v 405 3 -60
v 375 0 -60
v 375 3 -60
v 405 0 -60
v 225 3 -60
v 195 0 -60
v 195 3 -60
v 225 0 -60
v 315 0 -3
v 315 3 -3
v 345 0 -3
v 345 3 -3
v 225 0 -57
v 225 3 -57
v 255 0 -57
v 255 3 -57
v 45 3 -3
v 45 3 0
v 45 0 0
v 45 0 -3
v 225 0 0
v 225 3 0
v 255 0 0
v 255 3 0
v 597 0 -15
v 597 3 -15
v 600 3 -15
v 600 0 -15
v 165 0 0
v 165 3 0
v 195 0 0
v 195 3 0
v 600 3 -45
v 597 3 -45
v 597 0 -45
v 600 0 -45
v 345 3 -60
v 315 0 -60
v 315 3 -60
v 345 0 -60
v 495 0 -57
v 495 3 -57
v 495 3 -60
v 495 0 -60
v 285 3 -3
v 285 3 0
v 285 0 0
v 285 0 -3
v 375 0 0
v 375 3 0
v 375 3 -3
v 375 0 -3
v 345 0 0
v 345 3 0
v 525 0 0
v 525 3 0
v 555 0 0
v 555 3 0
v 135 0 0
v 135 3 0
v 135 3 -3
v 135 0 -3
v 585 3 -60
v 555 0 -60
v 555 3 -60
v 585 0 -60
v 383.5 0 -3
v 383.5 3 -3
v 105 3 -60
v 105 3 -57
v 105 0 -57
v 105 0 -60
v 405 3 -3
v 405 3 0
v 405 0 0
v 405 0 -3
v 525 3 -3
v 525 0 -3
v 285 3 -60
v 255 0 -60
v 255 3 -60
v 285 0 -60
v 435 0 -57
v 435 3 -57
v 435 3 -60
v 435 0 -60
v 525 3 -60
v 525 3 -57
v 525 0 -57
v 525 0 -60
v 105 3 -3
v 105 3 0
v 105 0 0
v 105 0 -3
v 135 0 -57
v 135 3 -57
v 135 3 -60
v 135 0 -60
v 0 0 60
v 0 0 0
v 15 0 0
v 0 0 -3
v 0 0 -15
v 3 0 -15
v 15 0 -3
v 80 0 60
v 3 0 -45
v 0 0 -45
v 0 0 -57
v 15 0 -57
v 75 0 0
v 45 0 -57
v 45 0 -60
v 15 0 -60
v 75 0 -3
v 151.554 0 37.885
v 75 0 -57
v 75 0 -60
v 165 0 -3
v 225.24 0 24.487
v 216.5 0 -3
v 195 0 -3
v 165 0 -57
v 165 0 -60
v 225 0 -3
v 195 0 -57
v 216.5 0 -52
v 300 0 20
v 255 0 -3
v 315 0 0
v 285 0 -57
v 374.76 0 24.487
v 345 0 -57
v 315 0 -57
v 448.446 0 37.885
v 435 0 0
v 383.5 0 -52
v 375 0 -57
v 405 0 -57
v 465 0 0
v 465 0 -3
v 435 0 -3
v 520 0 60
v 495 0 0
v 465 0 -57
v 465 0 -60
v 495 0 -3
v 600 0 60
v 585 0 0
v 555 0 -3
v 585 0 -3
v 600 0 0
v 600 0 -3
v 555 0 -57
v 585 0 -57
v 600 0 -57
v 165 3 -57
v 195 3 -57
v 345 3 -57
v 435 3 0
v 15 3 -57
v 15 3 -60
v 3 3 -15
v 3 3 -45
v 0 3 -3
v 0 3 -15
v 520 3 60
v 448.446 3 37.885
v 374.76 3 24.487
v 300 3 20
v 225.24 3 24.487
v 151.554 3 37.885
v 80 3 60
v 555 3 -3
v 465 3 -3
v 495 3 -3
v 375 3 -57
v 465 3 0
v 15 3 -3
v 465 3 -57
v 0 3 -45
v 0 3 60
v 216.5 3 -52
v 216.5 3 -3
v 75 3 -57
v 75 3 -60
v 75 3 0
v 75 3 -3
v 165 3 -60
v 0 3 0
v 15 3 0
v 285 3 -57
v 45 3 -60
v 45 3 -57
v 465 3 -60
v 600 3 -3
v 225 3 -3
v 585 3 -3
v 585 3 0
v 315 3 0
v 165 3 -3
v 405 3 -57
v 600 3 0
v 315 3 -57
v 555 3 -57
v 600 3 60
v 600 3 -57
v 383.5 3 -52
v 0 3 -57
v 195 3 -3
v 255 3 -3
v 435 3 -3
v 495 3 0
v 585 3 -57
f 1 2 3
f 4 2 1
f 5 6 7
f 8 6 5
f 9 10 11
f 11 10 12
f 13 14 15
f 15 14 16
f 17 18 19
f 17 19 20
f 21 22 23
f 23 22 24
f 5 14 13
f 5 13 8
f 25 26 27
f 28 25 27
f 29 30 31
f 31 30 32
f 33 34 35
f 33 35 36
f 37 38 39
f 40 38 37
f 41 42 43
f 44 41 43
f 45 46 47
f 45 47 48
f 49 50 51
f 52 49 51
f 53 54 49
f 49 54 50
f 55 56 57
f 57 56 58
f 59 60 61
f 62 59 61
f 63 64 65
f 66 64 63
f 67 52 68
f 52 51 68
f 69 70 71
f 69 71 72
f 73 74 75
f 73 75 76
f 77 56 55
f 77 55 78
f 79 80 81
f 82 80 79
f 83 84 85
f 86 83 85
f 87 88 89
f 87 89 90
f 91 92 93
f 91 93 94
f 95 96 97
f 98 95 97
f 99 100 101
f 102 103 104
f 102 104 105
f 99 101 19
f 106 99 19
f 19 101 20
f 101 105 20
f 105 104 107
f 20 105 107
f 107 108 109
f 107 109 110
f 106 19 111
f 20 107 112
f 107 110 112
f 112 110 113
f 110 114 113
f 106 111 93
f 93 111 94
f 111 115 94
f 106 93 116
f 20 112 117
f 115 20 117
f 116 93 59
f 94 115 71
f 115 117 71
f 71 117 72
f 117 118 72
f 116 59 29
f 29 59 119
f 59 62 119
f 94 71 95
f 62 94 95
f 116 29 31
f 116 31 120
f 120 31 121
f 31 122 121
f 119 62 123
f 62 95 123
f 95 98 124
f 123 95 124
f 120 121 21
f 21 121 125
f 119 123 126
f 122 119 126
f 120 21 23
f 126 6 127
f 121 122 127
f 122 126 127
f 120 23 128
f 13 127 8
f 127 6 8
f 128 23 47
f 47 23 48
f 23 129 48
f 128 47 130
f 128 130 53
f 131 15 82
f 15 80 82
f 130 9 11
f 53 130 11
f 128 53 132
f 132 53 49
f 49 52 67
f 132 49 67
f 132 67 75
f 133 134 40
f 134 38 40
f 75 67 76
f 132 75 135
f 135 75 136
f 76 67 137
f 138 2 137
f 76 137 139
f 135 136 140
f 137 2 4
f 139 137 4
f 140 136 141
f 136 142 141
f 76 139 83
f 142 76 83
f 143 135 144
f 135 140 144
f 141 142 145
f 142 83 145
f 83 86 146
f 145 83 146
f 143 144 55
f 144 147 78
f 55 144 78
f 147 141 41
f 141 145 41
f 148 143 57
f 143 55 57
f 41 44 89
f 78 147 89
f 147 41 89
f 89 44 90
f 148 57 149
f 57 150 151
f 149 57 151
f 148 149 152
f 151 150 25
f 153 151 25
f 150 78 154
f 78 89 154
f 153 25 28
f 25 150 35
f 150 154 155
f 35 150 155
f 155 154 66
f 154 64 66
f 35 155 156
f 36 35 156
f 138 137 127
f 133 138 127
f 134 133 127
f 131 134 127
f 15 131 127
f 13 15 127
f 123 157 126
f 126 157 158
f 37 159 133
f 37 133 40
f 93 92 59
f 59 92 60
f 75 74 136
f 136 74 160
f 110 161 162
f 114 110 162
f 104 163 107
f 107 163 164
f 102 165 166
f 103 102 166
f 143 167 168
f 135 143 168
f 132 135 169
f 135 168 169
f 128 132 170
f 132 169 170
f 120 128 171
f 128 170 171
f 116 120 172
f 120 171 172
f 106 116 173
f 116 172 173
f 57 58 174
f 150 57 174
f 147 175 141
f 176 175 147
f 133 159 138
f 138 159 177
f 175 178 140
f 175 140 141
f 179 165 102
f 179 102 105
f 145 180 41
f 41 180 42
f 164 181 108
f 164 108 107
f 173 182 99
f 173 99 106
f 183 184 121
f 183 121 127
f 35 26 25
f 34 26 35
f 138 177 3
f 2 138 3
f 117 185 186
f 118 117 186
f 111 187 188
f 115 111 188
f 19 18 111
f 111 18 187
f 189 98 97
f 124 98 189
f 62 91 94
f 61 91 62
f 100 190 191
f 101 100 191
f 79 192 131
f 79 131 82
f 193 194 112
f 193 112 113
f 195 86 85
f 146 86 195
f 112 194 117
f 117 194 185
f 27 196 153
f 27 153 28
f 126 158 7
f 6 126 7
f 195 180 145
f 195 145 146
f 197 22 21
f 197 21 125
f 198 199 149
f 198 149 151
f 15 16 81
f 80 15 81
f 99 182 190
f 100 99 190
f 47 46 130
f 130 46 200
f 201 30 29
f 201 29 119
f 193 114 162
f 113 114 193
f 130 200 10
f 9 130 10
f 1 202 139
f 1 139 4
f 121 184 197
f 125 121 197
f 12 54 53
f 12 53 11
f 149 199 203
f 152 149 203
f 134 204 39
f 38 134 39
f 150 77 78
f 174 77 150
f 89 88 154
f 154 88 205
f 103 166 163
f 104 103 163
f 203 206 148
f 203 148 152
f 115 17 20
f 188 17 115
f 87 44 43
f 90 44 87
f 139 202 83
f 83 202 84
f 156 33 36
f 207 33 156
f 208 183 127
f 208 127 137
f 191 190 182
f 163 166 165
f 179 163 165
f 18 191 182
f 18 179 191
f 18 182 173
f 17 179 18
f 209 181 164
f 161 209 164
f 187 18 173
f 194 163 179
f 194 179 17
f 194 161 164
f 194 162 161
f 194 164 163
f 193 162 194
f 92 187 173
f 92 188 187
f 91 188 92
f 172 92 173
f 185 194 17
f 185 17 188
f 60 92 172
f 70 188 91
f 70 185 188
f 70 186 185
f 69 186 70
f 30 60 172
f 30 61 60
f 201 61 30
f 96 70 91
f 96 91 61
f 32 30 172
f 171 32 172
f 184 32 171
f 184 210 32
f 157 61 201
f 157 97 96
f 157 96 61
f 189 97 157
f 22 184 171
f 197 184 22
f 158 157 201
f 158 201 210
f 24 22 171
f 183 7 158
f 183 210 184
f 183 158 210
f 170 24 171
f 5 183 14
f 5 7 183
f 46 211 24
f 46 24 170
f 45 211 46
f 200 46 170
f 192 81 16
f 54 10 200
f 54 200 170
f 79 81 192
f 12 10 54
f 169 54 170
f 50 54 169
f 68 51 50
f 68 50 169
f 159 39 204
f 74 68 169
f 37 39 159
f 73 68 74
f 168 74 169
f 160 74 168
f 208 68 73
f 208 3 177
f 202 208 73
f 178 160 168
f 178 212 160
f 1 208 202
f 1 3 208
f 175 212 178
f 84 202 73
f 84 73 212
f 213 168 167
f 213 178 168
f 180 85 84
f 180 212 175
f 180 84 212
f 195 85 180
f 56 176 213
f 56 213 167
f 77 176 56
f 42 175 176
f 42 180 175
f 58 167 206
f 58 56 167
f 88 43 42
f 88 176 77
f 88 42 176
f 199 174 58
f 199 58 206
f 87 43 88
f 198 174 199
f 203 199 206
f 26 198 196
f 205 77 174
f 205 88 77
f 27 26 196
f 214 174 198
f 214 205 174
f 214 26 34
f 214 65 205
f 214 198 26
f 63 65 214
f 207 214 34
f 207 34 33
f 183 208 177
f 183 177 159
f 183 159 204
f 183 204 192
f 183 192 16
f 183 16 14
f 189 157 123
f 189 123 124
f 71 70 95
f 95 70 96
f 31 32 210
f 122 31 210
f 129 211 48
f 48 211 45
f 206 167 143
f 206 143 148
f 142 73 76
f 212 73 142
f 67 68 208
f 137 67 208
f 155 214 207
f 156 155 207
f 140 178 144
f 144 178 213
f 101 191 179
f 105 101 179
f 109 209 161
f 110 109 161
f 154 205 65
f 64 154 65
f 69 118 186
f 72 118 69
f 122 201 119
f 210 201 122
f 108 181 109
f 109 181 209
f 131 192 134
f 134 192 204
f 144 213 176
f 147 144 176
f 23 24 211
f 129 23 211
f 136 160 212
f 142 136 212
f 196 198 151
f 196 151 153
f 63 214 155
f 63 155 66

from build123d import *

# Parameters (mm, degrees)
SKETCH1_W           = 600
SKETCH1_H           = 60
BOSS_EXTRUDE1_DEPTH = 3
SKETCH4_W           = 600
SKETCH4_H           = 60
BOSS_EXTRUDE4_DEPTH = 3
SKETCH2_W           = 30
SKETCH2_H           = 3
SKETCH2_W_2         = 3
SKETCH2_H_2         = 30
CUT_EXTRUDE1_DEPTH  = 5
SKETCH5_W           = 167
SKETCH5_H           = 49
CUT_EXTRUDE2_DEPTH  = 5
CUT_EXTRUDE3_DEPTH  = 5


with BuildPart() as part:
    # Sketch1 → Boss-Extrude1 (new body)
    with BuildSketch(Plane(origin=(0, 0, 0), x_dir=(1, 0, 0), z_dir=(0, 1, 0))):
        with Locations((300, 30)):
            Rectangle(SKETCH1_W, SKETCH1_H)
    extrude(amount=BOSS_EXTRUDE1_DEPTH)

    # Sketch4 → Boss-Extrude4 (add)
    with BuildSketch(Plane(origin=(0, 3, 0), x_dir=(1, 0, 0), z_dir=(0, 1, 0))):
        with Locations((300, -30)):
            Rectangle(SKETCH4_W, SKETCH4_H)
    extrude(amount=-BOSS_EXTRUDE4_DEPTH)

    # Sketch2 → Cut-Extrude1 (cut)
    with BuildSketch(Plane(origin=(0, 3, 0), x_dir=(1, 0, 0), z_dir=(0, 1, 0))):
        with Locations((0, 1.5)):
            Rectangle(SKETCH2_W, SKETCH2_H)
        with Locations((60, 1.5)):
            Rectangle(SKETCH2_W, SKETCH2_H)
        with Locations((120, 1.5)):
            Rectangle(SKETCH2_W, SKETCH2_H)
        with Locations((180, 1.5)):
            Rectangle(SKETCH2_W, SKETCH2_H)
        with Locations((240, 1.5)):
            Rectangle(SKETCH2_W, SKETCH2_H)
        with Locations((300, 1.5)):
            Rectangle(SKETCH2_W, SKETCH2_H)
        with Locations((360, 1.5)):
            Rectangle(SKETCH2_W, SKETCH2_H)
        with Locations((420, 1.5)):
            Rectangle(SKETCH2_W, SKETCH2_H)
        with Locations((480, 1.5)):
            Rectangle(SKETCH2_W, SKETCH2_H)
        with Locations((540, 1.5)):
            Rectangle(SKETCH2_W, SKETCH2_H)
        with Locations((598.5, 30)):
            Rectangle(SKETCH2_W_2, SKETCH2_H_2)
        with Locations((540, 58.5)):
            Rectangle(SKETCH2_W, SKETCH2_H)
        with Locations((480, 58.5)):
            Rectangle(SKETCH2_W, SKETCH2_H)
        with Locations((420, 58.5)):
            Rectangle(SKETCH2_W, SKETCH2_H)
        with Locations((360, 58.5)):
            Rectangle(SKETCH2_W, SKETCH2_H)
        with Locations((300, 58.5)):
            Rectangle(SKETCH2_W, SKETCH2_H)
        with Locations((240, 58.5)):
            Rectangle(SKETCH2_W, SKETCH2_H)
        with Locations((180, 58.5)):
            Rectangle(SKETCH2_W, SKETCH2_H)
        with Locations((120, 58.5)):
            Rectangle(SKETCH2_W, SKETCH2_H)
        with Locations((60, 58.5)):
            Rectangle(SKETCH2_W, SKETCH2_H)
        with Locations((0, 58.5)):
            Rectangle(SKETCH2_W, SKETCH2_H)
        with Locations((1.5, 30)):
            Rectangle(SKETCH2_W_2, SKETCH2_H_2)
        with Locations((600, 1.5)):
            Rectangle(SKETCH2_W, SKETCH2_H)
        with Locations((600, 58.5)):
            Rectangle(SKETCH2_W, SKETCH2_H)
    extrude(amount=-CUT_EXTRUDE1_DEPTH, mode=Mode.SUBTRACT)

    # Sketch5 → Cut-Extrude2 (cut)
    with BuildSketch(Plane(origin=(0, 3, 0), x_dir=(1, 0, 0), z_dir=(0, 1, 0))):
        with Locations((300, 27.5)):
            Rectangle(SKETCH5_W, SKETCH5_H)
    extrude(amount=-CUT_EXTRUDE2_DEPTH, mode=Mode.SUBTRACT)

    # Sketch6 → Cut-Extrude3 (cut)
    with BuildSketch(Plane(origin=(0, 3, 0), x_dir=(1, 0, 0), z_dir=(0, 1, 0))):
        with BuildLine():
            Line((80, -60), (520, -60))
            ThreePointArc((520, -60), (300, -20), (80, -60))
        make_face()
    extrude(amount=-CUT_EXTRUDE3_DEPTH, mode=Mode.SUBTRACT)


solid = part.part
